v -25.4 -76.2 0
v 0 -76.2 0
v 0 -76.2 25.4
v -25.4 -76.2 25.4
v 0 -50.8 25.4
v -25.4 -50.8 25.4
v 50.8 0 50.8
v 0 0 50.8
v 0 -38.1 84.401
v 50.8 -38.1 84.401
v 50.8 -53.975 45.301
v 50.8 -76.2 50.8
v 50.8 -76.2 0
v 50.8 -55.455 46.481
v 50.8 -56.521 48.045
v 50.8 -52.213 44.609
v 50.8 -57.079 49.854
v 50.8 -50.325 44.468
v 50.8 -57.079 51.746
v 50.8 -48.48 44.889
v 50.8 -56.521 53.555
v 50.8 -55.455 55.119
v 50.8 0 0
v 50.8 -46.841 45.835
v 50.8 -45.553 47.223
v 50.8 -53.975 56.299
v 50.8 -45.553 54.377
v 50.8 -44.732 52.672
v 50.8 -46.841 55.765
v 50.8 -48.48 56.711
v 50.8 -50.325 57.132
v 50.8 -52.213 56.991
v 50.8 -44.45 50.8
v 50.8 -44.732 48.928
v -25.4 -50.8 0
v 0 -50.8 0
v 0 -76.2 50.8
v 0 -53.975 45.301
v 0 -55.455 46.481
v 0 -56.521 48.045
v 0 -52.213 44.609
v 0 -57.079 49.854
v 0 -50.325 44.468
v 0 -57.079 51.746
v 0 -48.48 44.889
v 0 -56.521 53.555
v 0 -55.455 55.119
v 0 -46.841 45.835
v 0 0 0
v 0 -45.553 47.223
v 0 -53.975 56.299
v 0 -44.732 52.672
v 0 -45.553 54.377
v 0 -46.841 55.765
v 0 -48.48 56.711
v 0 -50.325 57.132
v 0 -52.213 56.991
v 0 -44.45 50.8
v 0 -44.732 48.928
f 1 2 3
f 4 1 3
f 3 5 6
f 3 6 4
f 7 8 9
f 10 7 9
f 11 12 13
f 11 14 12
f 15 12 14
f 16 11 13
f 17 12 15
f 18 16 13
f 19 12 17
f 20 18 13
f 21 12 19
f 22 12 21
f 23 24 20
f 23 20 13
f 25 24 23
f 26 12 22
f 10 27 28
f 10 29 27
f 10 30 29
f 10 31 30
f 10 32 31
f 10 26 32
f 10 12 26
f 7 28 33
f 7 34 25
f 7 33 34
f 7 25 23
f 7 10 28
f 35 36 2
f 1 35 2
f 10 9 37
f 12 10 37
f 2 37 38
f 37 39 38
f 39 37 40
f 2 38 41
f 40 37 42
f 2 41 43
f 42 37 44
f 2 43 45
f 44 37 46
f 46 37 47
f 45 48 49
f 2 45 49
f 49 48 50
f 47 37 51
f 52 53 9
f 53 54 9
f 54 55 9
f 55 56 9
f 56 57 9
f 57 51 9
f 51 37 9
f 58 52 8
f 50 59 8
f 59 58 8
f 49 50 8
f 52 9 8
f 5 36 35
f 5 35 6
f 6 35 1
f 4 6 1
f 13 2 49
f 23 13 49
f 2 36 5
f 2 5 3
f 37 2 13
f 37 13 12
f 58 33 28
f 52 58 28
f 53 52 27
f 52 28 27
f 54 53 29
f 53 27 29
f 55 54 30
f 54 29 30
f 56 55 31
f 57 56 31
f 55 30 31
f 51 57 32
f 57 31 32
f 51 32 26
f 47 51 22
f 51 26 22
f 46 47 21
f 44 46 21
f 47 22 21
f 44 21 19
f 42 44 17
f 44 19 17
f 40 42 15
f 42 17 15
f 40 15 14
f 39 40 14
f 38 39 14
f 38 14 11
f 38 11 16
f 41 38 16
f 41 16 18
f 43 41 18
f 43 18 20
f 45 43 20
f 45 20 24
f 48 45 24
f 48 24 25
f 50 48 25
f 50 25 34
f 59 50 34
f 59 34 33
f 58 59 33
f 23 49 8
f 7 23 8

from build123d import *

# Parameters (mm, degrees)
F0_W     = 76.2
F0_H     = 50.8
F1_DEPTH = 50.8
F2_R     = 6.35
F3_DEPTH = 50.801
F5_DEPTH = 182
F6_W     = 25.4
F6_H     = 25.4
F7_DEPTH = 25.4


# Not quite as in the source:
# - an extrude ends at something that could not be found from the text; its depth is read off the source's solid


with BuildPart() as f1:
    # F0 (on Right) → F1 (new body)
    with BuildSketch(Plane.YZ):
        with Locations((-38.1, 25.4)):
            Rectangle(F0_W, F0_H)
        Polygon((-76.2, 50.8), (0, 50.8), (-38.1, 84.4010416505), align=None)
    extrude(amount=F1_DEPTH)

    # F2 (on face) → F3 (cut, through all)
    with BuildSketch(Plane.YZ.offset(50.8)):
        with Locations((-50.8, 50.8)):
            Circle(F2_R)
    extrude(amount=-F3_DEPTH, mode=Mode.SUBTRACT)

    # F4 (on Right) → F5 (cut, through all)
    with BuildSketch(Plane.YZ):
        with BuildLine():
            add(Edge.make_bspline(
                [(39.2249748279, 36.9491242033), (39.1707624624, 37.3291437229), (45.6123477048, 50.2146208478), (62.3111618585, 34.8878075899), (38.0564666464, 34.8735909417), (51.9023345065, 38.8834101985), (42.5172270712, 42.0337126477), (39.262733644, 36.6844412837), (39.2249748279, 36.9491242033)],
                knots=[0, 0, 0, 0, 0.1947455978, 0.3915991224, 0.5908148595, 0.7271841262, 0.8643600374, 1, 1, 1, 1], degree=3))
        make_face()
    extrude(amount=-F5_DEPTH, mode=Mode.SUBTRACT)


with BuildPart() as f7:
    # F6 (on face) → F7 (new body)
    with BuildSketch(Plane(origin=(0, 0, 0), x_dir=(0, -1, 0), z_dir=(-1, 0, 0))):
        with Locations((63.5, 12.7)):
            Rectangle(F6_W, F6_H)
    extrude(amount=F7_DEPTH)


solid = Compound([f1.part, f7.part])
